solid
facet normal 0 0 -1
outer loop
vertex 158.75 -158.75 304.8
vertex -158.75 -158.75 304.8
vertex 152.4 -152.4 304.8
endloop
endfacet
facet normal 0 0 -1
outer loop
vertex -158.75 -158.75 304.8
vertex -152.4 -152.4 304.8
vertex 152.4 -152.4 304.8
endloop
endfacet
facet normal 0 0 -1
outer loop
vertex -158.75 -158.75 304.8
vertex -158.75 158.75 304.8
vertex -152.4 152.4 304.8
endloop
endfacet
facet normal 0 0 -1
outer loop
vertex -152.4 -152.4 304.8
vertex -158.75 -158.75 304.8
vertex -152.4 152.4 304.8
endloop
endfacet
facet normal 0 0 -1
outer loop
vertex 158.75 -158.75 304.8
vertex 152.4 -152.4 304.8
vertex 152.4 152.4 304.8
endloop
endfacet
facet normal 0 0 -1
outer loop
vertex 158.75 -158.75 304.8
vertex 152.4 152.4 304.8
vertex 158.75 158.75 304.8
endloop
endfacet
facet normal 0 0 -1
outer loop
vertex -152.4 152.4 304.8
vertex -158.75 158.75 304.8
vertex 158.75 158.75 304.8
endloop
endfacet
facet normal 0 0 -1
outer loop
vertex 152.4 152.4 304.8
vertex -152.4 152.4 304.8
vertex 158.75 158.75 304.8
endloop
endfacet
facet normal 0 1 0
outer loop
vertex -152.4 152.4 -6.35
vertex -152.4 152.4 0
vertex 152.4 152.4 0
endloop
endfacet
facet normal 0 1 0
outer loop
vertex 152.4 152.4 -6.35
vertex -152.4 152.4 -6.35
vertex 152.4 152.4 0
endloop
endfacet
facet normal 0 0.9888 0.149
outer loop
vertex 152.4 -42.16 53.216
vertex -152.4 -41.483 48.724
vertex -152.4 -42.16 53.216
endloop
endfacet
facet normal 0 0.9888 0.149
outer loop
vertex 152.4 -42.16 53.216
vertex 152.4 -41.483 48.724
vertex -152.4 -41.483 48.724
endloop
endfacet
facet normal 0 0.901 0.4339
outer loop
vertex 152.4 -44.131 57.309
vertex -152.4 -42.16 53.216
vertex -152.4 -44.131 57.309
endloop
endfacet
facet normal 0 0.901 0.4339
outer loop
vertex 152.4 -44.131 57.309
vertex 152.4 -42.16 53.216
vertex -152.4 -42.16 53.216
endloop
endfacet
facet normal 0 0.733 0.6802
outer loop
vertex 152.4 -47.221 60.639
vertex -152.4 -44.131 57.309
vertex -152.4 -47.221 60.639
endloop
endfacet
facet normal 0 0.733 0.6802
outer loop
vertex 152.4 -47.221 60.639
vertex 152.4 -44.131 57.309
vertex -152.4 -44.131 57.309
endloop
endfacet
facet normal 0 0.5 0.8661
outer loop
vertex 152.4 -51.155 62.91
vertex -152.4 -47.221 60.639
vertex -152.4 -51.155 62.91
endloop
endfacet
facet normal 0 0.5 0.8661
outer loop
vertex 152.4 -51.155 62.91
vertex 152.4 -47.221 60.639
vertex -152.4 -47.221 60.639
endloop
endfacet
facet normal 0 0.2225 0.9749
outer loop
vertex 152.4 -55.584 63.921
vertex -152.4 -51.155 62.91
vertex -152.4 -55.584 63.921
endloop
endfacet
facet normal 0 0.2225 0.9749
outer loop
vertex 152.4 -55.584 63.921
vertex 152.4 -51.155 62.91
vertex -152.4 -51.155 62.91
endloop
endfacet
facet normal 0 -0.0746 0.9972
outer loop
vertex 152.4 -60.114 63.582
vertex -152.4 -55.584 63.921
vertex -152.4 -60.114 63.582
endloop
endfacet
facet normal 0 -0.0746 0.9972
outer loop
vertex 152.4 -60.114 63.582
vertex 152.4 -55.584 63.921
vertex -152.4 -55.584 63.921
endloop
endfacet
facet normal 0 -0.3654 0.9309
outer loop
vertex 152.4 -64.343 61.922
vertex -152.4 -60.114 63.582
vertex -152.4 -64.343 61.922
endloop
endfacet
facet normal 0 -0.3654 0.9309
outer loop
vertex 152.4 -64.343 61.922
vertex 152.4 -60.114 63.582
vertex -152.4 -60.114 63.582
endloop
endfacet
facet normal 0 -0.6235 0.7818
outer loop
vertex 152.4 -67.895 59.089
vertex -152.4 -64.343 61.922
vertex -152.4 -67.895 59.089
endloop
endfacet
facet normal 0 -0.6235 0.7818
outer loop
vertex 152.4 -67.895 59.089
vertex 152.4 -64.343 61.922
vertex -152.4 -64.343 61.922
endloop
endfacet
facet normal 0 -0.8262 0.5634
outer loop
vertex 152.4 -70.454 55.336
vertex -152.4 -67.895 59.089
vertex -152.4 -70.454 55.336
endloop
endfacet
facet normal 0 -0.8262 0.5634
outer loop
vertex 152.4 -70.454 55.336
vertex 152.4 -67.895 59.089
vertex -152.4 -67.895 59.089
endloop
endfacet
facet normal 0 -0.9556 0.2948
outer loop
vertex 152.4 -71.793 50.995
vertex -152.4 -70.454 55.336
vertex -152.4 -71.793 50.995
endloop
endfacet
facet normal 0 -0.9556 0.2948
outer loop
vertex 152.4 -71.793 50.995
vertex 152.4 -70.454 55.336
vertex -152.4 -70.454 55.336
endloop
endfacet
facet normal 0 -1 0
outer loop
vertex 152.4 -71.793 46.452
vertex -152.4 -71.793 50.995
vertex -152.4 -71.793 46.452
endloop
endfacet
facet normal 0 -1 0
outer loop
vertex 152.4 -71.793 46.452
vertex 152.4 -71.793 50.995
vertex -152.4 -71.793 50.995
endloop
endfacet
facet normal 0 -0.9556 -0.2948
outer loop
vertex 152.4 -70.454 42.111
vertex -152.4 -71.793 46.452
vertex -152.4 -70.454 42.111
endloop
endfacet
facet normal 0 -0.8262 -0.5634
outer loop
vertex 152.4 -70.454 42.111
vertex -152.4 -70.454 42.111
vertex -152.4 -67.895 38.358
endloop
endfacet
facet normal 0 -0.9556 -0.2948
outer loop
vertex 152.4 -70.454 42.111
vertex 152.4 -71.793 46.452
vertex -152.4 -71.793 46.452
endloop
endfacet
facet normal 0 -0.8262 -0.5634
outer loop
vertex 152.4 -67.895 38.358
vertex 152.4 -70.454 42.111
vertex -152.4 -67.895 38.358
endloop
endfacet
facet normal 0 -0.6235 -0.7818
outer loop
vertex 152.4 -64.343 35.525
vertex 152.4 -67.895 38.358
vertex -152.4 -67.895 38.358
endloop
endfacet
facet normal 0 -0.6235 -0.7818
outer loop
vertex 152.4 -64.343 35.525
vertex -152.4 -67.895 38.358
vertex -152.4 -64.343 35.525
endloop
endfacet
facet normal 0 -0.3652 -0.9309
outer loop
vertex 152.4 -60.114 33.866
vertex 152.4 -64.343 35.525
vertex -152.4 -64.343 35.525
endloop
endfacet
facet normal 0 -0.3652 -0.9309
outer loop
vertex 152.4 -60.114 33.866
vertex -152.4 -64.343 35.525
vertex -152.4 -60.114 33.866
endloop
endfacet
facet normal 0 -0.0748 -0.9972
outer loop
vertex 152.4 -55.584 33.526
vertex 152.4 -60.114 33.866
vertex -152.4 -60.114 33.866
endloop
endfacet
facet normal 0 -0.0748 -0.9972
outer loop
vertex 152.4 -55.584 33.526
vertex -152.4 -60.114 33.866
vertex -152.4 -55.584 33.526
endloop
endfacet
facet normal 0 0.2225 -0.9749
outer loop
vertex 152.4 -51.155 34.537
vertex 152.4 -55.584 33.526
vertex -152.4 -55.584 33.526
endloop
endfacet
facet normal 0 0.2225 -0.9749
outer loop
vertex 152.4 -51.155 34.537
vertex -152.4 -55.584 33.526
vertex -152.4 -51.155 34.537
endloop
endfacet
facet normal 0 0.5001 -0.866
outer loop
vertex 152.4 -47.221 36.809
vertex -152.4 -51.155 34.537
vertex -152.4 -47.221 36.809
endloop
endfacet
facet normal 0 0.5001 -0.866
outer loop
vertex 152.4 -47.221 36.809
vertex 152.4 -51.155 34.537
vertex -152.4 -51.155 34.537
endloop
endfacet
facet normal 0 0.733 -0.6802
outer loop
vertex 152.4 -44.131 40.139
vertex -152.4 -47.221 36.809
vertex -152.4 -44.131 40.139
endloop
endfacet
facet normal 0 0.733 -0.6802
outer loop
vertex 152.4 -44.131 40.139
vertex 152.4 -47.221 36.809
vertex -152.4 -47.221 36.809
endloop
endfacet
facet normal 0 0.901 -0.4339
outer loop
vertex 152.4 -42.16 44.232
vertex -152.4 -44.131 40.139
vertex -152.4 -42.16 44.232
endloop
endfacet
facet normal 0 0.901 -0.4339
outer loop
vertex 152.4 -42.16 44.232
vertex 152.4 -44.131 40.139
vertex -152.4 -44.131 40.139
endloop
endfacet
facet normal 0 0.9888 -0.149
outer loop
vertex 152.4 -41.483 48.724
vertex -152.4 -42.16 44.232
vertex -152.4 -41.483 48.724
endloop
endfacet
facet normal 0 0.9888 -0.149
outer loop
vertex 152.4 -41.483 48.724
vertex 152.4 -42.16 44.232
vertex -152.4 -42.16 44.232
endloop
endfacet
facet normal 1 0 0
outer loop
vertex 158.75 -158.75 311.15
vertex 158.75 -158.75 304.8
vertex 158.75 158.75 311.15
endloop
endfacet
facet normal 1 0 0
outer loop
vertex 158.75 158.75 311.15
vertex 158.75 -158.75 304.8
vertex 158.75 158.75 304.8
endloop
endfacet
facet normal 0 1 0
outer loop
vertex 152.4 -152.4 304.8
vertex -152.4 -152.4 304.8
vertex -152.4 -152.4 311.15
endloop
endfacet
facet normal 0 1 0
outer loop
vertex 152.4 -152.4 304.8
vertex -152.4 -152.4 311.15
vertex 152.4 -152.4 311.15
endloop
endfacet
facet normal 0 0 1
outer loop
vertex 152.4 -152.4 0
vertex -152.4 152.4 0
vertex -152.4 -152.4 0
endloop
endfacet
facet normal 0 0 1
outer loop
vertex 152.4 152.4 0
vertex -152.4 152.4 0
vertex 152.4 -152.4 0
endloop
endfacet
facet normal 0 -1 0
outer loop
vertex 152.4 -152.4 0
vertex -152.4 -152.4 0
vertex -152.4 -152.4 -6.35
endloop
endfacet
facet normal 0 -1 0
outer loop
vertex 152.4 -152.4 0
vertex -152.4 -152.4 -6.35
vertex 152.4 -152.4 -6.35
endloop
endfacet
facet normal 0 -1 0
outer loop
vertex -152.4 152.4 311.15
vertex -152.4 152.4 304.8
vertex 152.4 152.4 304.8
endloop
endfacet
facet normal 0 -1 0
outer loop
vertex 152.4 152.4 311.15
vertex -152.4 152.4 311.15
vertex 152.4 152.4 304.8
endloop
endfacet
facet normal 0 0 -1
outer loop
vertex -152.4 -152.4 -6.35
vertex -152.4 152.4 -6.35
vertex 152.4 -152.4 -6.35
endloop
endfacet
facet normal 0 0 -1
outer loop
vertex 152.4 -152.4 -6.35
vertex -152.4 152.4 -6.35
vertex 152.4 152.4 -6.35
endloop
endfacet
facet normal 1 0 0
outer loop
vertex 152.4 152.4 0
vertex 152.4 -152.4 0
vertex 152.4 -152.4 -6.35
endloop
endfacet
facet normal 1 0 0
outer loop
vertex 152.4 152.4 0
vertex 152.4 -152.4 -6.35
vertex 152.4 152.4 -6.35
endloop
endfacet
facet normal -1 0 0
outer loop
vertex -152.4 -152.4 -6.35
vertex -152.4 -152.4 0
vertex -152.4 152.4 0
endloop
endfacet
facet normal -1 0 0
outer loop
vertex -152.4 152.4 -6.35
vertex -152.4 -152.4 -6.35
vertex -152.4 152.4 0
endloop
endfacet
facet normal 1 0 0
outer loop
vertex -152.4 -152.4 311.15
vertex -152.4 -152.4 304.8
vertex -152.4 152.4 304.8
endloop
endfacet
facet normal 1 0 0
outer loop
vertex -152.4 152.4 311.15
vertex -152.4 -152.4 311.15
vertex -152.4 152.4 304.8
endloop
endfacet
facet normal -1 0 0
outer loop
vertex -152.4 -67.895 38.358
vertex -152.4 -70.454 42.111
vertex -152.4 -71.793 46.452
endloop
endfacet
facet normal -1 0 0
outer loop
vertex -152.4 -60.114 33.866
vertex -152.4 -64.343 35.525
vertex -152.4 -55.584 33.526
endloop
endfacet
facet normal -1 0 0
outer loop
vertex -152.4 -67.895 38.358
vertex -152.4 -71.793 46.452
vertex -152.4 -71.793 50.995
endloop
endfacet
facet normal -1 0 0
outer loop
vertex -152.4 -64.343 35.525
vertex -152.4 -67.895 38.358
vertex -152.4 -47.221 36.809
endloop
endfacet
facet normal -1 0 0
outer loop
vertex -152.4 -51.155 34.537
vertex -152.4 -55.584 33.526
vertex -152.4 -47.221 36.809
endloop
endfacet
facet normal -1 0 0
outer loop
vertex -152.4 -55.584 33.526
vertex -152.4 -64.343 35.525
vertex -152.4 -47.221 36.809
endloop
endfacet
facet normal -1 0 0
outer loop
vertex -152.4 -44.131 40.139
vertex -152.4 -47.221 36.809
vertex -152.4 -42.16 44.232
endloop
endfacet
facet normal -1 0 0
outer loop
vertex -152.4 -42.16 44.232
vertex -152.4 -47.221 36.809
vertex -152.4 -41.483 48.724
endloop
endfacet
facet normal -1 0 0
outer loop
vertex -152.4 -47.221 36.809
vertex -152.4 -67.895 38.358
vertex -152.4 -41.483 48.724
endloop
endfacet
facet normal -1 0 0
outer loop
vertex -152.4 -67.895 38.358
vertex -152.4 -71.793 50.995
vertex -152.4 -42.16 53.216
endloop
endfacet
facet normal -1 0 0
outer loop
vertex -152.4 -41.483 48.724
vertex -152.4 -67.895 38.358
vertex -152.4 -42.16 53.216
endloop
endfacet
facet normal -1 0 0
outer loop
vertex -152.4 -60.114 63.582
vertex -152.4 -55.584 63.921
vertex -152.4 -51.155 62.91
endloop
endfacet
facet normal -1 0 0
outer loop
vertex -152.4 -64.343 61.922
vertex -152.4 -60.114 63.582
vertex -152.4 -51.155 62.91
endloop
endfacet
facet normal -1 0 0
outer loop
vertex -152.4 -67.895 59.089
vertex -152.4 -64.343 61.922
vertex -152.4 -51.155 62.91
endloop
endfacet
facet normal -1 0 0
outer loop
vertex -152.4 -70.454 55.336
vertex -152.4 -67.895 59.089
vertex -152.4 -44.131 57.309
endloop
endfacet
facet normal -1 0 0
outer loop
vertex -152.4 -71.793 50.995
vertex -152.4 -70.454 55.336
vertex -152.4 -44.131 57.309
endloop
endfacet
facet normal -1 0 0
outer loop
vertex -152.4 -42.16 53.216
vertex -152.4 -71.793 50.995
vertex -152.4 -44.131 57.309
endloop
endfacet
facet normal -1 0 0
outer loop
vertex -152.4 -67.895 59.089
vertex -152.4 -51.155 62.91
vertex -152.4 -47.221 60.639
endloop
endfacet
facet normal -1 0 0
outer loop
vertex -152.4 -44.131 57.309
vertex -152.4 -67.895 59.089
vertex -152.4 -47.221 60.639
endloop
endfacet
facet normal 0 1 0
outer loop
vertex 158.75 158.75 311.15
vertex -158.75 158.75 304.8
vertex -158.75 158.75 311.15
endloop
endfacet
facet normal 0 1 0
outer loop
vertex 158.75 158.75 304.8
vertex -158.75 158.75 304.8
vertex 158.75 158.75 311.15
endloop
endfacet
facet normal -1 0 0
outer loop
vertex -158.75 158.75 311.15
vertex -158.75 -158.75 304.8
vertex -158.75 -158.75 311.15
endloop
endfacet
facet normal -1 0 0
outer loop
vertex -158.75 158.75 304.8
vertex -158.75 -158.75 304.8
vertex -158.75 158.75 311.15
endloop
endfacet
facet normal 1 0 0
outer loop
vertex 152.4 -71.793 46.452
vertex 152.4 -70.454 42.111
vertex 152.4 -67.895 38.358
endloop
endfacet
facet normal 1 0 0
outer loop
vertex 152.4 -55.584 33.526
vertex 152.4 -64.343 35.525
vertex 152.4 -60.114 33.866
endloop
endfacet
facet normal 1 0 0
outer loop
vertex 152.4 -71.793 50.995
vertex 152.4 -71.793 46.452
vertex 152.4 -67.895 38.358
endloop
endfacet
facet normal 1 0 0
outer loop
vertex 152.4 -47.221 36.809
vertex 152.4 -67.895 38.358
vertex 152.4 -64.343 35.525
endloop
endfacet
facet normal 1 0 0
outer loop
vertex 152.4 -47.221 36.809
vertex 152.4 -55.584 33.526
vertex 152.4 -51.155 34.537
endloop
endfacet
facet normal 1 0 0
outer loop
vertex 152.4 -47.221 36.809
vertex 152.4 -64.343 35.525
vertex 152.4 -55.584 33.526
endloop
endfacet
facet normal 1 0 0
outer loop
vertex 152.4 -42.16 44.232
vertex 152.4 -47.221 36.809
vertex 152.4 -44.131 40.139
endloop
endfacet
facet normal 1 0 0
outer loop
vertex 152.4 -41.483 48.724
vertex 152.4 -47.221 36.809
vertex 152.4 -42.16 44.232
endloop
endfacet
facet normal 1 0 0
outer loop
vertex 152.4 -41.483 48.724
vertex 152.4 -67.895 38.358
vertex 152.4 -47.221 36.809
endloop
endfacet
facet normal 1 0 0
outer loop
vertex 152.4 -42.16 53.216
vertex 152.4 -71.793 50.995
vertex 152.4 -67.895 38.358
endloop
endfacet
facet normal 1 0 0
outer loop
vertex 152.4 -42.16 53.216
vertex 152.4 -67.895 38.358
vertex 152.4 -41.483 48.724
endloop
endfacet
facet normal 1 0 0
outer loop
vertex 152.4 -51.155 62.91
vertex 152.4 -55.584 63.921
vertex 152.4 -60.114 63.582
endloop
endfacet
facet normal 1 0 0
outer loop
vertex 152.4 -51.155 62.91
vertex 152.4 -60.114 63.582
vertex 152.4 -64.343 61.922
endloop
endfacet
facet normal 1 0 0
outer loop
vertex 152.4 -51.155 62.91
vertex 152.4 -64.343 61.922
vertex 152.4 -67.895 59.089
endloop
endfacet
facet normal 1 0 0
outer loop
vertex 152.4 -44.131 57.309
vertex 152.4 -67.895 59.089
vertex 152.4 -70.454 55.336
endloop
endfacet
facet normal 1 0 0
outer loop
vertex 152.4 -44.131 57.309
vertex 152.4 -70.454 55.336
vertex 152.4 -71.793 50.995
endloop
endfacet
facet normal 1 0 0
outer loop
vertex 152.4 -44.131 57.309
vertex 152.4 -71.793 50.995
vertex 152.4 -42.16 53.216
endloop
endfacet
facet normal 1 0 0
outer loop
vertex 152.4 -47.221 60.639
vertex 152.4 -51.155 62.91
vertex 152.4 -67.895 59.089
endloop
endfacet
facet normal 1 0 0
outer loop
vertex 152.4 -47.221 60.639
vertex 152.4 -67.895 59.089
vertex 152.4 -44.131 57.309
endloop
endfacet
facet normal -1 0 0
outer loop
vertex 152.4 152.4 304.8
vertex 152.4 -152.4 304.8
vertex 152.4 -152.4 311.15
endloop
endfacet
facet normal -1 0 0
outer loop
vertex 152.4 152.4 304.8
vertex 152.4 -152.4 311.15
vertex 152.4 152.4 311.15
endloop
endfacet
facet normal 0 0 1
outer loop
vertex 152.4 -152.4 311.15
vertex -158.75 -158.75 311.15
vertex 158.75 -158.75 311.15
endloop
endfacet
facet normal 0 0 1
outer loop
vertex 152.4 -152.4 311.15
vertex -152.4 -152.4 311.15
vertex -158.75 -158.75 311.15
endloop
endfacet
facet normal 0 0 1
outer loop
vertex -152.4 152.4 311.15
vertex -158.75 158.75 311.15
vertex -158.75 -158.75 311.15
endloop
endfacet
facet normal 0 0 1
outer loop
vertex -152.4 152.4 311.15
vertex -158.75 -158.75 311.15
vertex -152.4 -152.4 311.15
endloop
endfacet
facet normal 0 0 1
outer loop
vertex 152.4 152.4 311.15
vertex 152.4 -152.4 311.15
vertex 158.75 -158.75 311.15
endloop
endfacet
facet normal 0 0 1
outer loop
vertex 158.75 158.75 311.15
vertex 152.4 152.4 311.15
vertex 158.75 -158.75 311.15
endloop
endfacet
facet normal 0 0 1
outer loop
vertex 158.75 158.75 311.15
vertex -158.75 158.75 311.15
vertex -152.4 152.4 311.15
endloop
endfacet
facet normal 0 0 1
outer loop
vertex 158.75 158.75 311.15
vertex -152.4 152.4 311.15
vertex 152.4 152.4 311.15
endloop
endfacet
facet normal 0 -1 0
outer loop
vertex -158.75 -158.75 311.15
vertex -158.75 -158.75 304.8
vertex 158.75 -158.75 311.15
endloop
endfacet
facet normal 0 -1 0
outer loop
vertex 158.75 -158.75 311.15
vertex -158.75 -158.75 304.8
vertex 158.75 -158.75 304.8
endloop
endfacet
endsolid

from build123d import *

# Parameters (mm, degrees)
F0_W          = 304.8
F0_H          = 304.8
F1_DEPTH      = 6.35
F3_W          = 317.5
F3_H          = 317.5
F3_W_2        = 304.8
F3_H_2        = 304.8
F4_DEPTH      = 6.35
F5_R          = 15.24
F6_DEPTH      = 152.4
F6_DEPTH_BACK = 152.4


with BuildPart() as f1:
    # F0 (on Top) → F1 (new body)
    with BuildSketch(Plane.XY):
        Rectangle(F0_W, F0_H)
    extrude(amount=-F1_DEPTH)


with BuildPart() as f4:
    # F3 (on offset) → F4 (new body)
    with BuildSketch(Plane.XY.offset(304.8)):
        Rectangle(F3_W, F3_H)
        Rectangle(F3_W_2, F3_H_2, mode=Mode.SUBTRACT)
    extrude(amount=F4_DEPTH)


with BuildPart() as f6:
    # F5 (on Right) → F6 (new body, two sides)
    with BuildSketch(Plane.YZ) as f6_sk:
        with Locations((-56.723166, 48.723623)):
            Circle(F5_R)
    extrude(amount=F6_DEPTH)
    extrude(f6_sk.sketch, amount=-F6_DEPTH_BACK)


solid = Compound([f1.part, f4.part, f6.part])
